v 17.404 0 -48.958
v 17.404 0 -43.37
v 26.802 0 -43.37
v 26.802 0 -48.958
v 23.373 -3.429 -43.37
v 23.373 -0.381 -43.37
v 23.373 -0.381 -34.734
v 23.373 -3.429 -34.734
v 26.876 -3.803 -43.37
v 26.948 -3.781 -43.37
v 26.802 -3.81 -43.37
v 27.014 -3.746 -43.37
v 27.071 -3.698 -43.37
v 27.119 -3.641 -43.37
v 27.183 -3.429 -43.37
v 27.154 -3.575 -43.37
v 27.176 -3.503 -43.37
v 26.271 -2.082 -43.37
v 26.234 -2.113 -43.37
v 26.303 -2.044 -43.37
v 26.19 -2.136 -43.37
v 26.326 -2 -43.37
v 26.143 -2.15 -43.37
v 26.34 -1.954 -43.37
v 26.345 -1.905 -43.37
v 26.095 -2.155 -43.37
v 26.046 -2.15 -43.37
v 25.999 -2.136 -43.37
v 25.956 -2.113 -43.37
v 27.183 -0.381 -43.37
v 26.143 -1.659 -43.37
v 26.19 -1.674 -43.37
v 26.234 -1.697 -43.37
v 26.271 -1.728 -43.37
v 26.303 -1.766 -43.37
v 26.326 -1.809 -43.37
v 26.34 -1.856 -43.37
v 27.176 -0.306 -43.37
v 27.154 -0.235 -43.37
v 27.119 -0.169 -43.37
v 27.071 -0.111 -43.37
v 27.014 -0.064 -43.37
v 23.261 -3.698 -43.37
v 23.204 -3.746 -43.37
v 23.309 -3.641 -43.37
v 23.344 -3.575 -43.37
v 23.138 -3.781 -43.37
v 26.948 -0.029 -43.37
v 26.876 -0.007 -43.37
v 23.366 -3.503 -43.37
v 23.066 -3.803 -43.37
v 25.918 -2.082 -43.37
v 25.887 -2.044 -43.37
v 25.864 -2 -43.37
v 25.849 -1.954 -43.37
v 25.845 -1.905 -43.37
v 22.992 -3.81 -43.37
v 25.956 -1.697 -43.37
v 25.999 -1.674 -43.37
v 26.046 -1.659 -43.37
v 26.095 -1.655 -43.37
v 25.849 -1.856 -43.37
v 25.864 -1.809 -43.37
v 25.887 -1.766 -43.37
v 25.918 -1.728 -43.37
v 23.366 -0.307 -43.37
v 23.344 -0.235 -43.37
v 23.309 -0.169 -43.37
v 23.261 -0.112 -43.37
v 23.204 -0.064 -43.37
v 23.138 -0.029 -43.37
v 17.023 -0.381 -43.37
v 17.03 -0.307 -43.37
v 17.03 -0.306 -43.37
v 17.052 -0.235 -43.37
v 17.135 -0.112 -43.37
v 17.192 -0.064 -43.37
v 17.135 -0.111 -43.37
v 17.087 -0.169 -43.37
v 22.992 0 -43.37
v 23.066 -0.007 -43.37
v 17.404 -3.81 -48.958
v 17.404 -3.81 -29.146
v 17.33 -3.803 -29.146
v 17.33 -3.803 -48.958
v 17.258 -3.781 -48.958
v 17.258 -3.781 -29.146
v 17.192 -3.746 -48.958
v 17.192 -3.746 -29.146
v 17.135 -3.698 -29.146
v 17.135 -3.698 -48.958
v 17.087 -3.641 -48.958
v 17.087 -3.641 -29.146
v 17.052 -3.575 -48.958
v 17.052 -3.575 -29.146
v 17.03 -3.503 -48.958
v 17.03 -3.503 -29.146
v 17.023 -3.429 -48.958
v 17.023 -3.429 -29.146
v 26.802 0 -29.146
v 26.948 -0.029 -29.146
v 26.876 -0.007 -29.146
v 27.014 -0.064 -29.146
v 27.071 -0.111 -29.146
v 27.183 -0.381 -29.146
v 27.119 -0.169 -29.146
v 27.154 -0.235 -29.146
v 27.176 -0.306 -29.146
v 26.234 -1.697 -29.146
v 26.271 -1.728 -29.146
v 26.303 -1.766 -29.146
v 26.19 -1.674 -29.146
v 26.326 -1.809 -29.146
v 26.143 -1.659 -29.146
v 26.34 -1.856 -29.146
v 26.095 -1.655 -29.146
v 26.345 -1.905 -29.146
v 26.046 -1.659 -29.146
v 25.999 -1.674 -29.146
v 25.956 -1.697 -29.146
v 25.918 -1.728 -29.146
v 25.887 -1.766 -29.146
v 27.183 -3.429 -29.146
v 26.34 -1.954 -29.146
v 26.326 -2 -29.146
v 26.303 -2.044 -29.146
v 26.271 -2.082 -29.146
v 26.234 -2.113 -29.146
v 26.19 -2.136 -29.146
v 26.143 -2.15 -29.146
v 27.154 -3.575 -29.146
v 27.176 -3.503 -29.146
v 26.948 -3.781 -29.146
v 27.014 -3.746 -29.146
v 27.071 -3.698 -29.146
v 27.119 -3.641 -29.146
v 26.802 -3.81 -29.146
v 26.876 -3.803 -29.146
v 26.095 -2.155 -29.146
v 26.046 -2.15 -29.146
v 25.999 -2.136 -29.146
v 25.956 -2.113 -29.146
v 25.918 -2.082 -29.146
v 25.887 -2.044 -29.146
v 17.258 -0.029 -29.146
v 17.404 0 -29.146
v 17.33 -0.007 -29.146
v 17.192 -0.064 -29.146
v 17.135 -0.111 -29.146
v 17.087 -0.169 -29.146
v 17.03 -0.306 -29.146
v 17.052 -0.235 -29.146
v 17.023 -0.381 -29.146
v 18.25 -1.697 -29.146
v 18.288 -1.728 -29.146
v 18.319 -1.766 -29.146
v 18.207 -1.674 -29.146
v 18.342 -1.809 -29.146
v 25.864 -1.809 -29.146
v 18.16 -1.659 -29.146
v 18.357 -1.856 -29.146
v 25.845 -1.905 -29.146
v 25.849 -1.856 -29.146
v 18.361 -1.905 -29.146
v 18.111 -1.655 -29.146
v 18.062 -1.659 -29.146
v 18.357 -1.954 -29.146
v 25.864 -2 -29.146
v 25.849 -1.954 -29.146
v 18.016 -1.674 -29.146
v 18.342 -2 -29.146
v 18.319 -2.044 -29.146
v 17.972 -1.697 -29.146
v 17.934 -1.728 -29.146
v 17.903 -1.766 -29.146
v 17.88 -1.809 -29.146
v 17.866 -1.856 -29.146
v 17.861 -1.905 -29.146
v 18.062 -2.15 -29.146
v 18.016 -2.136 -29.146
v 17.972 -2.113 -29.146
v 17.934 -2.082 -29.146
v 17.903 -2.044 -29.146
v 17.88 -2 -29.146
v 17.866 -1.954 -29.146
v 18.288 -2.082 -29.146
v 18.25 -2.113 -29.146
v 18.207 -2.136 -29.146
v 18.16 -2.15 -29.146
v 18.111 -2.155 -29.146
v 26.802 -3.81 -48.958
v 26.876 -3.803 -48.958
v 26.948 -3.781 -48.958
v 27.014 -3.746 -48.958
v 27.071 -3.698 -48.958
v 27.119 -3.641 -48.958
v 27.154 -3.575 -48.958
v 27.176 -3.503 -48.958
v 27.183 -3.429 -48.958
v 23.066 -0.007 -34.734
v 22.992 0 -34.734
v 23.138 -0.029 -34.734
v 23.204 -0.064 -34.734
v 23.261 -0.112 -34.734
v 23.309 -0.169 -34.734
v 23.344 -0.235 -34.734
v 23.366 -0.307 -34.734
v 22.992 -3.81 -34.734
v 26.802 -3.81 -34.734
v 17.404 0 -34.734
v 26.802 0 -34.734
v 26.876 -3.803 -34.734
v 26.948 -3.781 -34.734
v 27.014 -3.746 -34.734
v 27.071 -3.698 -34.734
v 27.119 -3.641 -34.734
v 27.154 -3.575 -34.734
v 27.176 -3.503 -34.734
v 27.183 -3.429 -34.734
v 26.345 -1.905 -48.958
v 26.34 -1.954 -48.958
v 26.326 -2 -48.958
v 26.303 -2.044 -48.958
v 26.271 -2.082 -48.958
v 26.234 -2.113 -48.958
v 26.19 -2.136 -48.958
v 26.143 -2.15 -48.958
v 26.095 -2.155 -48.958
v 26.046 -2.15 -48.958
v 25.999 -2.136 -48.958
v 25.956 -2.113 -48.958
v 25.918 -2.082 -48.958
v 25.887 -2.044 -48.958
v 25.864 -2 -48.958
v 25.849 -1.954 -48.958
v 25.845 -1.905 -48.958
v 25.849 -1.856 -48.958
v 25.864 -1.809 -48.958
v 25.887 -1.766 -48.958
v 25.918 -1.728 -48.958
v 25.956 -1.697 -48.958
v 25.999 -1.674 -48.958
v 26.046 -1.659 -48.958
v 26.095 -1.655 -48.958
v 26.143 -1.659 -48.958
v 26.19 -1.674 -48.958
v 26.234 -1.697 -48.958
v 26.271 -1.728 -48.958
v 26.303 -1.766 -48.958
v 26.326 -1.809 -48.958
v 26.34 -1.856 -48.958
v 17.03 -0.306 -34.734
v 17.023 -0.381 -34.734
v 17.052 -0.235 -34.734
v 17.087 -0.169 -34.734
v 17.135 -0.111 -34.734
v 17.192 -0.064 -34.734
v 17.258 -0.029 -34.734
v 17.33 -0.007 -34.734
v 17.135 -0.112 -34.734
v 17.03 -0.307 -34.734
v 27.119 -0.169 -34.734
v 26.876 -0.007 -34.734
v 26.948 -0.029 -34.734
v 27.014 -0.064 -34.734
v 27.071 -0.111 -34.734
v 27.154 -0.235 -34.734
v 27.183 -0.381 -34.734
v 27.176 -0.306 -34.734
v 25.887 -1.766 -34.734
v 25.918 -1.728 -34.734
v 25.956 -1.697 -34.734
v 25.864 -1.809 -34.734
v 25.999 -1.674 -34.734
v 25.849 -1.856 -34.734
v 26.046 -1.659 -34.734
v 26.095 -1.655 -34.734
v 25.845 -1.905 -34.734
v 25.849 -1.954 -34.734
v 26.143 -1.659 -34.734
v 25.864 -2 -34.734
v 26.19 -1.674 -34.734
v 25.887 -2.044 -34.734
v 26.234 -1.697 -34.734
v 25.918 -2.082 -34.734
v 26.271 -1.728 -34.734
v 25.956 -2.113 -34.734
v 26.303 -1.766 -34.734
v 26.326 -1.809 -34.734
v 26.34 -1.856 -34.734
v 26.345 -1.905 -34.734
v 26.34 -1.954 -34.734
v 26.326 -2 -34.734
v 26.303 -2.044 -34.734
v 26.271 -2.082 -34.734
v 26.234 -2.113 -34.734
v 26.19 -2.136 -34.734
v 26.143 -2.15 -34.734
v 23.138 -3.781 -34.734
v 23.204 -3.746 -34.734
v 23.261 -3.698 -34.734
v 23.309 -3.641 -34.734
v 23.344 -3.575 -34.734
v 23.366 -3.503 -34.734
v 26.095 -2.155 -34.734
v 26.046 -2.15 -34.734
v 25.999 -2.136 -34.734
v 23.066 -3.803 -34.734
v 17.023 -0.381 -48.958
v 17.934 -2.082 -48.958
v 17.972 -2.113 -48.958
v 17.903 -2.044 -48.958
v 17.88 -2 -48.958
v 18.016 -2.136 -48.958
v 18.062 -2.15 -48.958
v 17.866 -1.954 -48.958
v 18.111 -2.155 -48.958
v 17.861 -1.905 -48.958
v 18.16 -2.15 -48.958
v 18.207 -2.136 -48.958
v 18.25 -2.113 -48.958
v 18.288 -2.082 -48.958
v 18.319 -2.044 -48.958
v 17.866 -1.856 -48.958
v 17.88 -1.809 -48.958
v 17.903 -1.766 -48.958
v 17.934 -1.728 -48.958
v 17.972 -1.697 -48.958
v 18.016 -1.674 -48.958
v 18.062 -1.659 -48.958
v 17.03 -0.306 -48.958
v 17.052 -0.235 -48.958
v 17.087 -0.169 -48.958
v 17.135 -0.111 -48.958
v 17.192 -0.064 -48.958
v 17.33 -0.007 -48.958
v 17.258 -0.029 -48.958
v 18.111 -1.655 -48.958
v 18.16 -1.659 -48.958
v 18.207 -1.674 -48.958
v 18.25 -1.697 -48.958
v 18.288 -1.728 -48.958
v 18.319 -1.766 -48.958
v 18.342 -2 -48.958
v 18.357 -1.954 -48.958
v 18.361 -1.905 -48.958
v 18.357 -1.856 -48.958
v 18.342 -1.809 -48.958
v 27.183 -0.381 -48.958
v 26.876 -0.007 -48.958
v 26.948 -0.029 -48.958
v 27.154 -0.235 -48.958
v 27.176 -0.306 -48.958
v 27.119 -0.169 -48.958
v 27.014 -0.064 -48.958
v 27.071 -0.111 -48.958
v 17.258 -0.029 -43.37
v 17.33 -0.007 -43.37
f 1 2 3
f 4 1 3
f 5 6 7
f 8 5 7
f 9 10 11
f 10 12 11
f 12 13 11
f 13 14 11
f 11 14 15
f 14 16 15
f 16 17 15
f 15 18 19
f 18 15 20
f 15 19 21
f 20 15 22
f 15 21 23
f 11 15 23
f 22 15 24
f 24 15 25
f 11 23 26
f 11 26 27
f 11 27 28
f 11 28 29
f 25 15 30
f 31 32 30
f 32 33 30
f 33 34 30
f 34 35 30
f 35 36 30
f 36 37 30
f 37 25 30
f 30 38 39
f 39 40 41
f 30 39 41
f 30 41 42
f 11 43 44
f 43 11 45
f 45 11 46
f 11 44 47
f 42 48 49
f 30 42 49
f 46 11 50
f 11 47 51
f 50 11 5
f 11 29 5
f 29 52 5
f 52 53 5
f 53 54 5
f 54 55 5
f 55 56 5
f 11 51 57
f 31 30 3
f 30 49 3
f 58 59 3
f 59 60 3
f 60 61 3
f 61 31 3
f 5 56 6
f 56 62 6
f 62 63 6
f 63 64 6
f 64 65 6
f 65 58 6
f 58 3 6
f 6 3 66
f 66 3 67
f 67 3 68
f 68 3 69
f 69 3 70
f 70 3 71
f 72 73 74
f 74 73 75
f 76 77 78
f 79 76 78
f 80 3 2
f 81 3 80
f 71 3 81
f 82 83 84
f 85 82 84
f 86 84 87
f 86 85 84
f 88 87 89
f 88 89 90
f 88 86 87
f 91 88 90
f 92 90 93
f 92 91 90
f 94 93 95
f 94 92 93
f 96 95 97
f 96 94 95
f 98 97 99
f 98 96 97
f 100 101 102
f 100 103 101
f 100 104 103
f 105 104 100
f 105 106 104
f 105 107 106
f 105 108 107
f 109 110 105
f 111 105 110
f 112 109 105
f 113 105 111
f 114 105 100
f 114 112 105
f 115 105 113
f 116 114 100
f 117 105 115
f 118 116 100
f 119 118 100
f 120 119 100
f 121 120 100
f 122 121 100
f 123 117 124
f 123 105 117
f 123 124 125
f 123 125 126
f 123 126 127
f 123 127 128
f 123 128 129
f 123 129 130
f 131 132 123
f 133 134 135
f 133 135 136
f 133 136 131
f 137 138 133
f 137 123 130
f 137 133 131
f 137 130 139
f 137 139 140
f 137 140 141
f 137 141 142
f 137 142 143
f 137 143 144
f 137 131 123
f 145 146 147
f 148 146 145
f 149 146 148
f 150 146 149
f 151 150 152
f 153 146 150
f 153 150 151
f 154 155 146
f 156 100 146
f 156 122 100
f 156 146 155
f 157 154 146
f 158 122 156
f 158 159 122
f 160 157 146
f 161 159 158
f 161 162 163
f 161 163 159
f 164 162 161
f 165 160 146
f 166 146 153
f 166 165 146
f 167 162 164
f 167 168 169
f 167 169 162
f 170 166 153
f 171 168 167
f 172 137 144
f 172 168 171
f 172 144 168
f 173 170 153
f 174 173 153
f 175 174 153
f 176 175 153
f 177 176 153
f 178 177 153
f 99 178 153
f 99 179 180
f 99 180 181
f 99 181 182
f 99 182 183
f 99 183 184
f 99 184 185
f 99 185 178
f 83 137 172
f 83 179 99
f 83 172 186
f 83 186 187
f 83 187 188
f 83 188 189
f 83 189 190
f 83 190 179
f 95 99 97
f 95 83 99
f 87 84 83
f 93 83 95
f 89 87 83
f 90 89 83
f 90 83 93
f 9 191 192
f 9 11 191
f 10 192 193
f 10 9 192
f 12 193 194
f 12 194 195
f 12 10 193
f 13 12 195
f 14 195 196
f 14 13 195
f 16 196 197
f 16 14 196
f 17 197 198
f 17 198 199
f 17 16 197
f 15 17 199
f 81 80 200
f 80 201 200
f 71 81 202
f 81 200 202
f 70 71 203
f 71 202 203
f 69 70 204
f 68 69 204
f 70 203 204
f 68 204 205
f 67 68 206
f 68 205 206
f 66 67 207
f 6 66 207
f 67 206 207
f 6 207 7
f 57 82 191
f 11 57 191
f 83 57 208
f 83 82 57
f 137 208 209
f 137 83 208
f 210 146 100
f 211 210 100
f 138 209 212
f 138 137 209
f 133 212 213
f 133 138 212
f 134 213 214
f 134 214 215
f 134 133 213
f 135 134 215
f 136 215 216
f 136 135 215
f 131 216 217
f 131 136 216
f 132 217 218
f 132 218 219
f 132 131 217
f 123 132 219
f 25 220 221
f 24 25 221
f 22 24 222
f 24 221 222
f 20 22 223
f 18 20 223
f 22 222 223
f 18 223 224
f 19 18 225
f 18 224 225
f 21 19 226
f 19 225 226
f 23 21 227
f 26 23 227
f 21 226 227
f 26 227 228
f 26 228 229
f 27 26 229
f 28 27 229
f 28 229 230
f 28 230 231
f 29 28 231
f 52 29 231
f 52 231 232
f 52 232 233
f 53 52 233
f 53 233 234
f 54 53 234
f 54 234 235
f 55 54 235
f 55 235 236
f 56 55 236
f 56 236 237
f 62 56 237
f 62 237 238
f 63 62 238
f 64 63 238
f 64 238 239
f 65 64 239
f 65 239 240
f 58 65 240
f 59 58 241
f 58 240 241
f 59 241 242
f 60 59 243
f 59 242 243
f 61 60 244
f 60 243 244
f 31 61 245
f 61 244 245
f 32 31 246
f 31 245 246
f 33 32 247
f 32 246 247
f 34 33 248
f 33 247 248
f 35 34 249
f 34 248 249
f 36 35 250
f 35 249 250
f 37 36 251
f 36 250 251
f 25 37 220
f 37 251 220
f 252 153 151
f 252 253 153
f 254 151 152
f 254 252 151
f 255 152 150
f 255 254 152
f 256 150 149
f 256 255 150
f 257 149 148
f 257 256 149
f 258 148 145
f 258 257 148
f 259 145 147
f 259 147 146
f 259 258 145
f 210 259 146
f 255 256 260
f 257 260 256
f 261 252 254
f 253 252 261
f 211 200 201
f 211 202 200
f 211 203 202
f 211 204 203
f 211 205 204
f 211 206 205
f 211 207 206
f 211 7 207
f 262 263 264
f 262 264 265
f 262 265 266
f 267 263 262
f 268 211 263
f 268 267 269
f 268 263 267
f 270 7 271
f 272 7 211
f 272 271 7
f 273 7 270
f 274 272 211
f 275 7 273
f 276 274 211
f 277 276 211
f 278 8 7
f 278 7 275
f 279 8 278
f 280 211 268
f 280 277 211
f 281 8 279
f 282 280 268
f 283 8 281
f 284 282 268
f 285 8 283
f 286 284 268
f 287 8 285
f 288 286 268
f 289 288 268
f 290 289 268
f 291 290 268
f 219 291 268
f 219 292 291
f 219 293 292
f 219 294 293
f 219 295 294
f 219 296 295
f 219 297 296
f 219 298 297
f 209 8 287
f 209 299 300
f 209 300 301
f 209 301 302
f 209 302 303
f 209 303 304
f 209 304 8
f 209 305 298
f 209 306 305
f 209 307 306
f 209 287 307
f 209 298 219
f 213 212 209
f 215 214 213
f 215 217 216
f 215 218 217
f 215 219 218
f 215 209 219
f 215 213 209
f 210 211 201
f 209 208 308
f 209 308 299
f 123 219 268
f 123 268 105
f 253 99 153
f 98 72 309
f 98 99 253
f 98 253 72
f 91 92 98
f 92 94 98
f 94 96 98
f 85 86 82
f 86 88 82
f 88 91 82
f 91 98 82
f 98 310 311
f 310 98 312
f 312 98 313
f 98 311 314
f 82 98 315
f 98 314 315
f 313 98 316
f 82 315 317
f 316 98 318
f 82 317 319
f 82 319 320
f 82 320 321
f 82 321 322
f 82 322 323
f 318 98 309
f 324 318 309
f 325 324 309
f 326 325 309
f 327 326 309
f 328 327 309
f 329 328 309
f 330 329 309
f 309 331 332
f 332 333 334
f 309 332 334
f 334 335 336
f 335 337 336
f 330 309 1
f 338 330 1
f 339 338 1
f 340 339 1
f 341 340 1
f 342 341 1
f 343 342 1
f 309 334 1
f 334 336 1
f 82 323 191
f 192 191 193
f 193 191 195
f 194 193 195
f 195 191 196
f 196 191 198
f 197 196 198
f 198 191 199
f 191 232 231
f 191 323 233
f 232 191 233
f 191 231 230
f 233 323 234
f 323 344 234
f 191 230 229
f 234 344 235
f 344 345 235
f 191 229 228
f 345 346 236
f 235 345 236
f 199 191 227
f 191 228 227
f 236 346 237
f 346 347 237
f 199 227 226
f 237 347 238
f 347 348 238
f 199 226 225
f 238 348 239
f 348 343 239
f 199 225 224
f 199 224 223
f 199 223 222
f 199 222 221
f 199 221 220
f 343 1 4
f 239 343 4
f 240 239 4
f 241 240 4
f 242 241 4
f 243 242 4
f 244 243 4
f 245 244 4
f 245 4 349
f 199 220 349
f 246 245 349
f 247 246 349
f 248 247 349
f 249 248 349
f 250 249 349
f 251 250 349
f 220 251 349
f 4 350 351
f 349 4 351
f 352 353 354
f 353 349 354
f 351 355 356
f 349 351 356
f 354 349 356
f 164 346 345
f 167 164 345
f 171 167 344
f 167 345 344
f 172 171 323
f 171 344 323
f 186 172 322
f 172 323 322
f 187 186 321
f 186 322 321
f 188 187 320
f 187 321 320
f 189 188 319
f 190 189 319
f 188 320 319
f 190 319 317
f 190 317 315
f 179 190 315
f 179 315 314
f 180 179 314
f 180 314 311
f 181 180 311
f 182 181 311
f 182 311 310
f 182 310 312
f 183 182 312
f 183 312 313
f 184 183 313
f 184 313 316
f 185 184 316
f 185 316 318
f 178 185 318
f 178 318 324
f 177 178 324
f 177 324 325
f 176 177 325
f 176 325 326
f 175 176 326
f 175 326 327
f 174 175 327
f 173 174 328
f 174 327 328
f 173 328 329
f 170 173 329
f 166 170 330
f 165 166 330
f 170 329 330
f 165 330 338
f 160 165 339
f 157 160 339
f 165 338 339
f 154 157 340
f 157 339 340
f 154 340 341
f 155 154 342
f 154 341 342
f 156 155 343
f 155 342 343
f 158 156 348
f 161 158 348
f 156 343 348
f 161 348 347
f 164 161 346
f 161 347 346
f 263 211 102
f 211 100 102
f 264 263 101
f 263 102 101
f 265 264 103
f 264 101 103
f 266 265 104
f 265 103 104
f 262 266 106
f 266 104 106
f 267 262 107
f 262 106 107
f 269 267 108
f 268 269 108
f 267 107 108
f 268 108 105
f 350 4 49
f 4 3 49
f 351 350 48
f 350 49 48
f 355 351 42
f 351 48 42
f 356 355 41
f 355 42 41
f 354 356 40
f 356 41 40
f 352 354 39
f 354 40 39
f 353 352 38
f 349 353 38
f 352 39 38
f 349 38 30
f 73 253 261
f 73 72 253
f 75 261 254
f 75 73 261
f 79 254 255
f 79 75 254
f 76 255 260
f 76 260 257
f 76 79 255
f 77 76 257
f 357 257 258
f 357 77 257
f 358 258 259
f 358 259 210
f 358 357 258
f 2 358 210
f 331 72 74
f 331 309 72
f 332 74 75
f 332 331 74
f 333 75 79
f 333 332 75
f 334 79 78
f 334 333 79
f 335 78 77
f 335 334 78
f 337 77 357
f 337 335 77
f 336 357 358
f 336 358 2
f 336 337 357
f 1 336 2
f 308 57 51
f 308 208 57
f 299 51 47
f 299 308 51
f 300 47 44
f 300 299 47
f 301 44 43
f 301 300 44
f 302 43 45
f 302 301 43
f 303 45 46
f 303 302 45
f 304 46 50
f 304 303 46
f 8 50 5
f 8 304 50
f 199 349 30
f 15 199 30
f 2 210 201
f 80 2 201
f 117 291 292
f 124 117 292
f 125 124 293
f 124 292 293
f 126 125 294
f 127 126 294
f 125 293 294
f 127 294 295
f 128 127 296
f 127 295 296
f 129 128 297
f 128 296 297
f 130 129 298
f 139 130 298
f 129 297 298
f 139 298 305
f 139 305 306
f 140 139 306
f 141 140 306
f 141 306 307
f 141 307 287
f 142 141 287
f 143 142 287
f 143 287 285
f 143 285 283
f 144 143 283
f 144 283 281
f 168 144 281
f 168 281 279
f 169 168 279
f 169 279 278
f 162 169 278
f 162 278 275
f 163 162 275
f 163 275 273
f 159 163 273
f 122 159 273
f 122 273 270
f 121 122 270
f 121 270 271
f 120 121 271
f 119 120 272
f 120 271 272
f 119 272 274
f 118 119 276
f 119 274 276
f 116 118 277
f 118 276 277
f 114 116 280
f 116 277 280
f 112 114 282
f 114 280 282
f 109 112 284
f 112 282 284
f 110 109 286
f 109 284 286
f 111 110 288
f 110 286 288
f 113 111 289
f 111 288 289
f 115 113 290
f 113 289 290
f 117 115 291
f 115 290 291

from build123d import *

# Parameters (mm, degrees)
F0_W     = 6.35
F0_H     = 8.636
F1_DEPTH = 3.81
F3_START = -0.000254
F3_DEPTH = 3.81
F4_R     = 0.2501042953
F5_DEPTH = 50.8
F6_R     = 0.381


# Not quite as in the source:
# - a feature names something its author has since deleted; it is built from what else it names


with BuildPart() as f1:
    # F0 (on Front) → F1 (new body)
    with BuildSketch(Plane.XZ):
        Polygon((27.1829397243, -29.1464989846), (17.0229397243, -29.1464989846), (17.0229397243, -34.7344989846), (23.3729397243, -34.7344989846), (27.1829397243, -34.7344989846), align=None)
        with Locations((20.1979397243, -39.0524989846)):
            Rectangle(F0_W, F0_H)
        Polygon((23.3729397243, -43.3704989846), (17.0229397243, -43.3704989846), (17.0229397243, -48.9584989846), (23.3729397243, -48.9584989846), (27.1829397243, -48.9584989846), (27.1829397243, -43.3704989846), align=None)
    extrude(amount=F1_DEPTH)

    # F2 (on face) → F3 (join)
    with BuildSketch(Plane.XZ.offset(3.81).offset(F3_START)):
        Polygon((27.1829397243, -29.1464989846), (17.0229397243, -29.1464989846), (17.0229397243, -34.7344989846), (23.3729397243, -34.7344989846), (27.1829397243, -34.7344989846), align=None)
        Polygon((27.1829397243, -43.3704989846), (23.3729397243, -43.3704989846), (17.0229397243, -43.3704989846), (17.0229397243, -48.9584989846), (27.1829397243, -48.9584989846), align=None)
    extrude(amount=-F3_DEPTH)

    # F4 (on face) → F5 (cut)
    with BuildSketch(Plane(origin=(0, 0, -48.9584989846), x_dir=(1, 0, 0), z_dir=(0, 0, -1))):
        with Locations((26.094635429, 1.904746)):
            Circle(F4_R)
        with Locations((18.1112440196, 1.904746)):
            Circle(F4_R)
    extrude(amount=-F5_DEPTH, mode=Mode.SUBTRACT)

    # F6 (call 1 of 10: OpenCascade refuses the feature's edges together)
    f6_edges = [f1.edges().sort_by_distance(p)[0] for p in [
        (27.18294, -3.81, -31.940499),
    ]]
    fillet(f6_edges, radius=F6_R)

    # F6#2 (call 2 of 10)
    f6_2_edges = [f1.edges().sort_by_distance(p)[0] for p in [
        (17.02294, -3.81, -39.052499),
    ]]
    fillet(f6_2_edges, radius=F6_R)

    # F6#3 (call 3 of 10)
    f6_3_edges = [f1.edges().sort_by_distance(p)[0] for p in [
        (27.18294, -3.81, -46.164499),
    ]]
    fillet(f6_3_edges, radius=F6_R)

    # F6#4 (call 4 of 10)
    f6_4_edges = [f1.edges().sort_by_distance(p)[0] for p in [
        (23.37294, -3.81, -39.052499),
    ]]
    fillet(f6_4_edges, radius=F6_R)

    # F6#5 (call 5 of 10)
    f6_5_edges = [f1.edges().sort_by_distance(p)[0] for p in [
        (23.37294, 0, -39.052499),
    ]]
    fillet(f6_5_edges, radius=F6_R)

    # F6#7 (call 6 of 10)
    f6_7_edges = [f1.edges().sort_by_distance(p)[0] for p in [
        (27.18294, 0.000254, -31.940499),
    ]]
    fillet(f6_7_edges, radius=F6_R)

    # F6#8 (call 7 of 10)
    f6_8_edges = [f1.edges().sort_by_distance(p)[0] for p in [
        (27.18294, 0.000254, -46.164499),
    ]]
    fillet(f6_8_edges, radius=F6_R)

    # F6#10 (call 8 of 10)
    f6_10_edges = [f1.edges().sort_by_distance(p)[0] for p in [
        (17.02294, 0, -39.052499),
    ]]
    fillet(f6_10_edges, radius=F6_R)

    # F6#6 (call 9 of 10)
    f6_6_edges = [f1.edges().sort_by_distance(p)[0] for p in [
        (17.02294, 0.000254, -31.940499),
    ]]
    fillet(f6_6_edges, radius=F6_R)

    # F6#9 (call 10 of 10)
    f6_9_edges = [f1.edges().sort_by_distance(p)[0] for p in [
        (17.02294, 0.000254, -46.164499),
    ]]
    fillet(f6_9_edges, radius=F6_R)


solid = f1.part
